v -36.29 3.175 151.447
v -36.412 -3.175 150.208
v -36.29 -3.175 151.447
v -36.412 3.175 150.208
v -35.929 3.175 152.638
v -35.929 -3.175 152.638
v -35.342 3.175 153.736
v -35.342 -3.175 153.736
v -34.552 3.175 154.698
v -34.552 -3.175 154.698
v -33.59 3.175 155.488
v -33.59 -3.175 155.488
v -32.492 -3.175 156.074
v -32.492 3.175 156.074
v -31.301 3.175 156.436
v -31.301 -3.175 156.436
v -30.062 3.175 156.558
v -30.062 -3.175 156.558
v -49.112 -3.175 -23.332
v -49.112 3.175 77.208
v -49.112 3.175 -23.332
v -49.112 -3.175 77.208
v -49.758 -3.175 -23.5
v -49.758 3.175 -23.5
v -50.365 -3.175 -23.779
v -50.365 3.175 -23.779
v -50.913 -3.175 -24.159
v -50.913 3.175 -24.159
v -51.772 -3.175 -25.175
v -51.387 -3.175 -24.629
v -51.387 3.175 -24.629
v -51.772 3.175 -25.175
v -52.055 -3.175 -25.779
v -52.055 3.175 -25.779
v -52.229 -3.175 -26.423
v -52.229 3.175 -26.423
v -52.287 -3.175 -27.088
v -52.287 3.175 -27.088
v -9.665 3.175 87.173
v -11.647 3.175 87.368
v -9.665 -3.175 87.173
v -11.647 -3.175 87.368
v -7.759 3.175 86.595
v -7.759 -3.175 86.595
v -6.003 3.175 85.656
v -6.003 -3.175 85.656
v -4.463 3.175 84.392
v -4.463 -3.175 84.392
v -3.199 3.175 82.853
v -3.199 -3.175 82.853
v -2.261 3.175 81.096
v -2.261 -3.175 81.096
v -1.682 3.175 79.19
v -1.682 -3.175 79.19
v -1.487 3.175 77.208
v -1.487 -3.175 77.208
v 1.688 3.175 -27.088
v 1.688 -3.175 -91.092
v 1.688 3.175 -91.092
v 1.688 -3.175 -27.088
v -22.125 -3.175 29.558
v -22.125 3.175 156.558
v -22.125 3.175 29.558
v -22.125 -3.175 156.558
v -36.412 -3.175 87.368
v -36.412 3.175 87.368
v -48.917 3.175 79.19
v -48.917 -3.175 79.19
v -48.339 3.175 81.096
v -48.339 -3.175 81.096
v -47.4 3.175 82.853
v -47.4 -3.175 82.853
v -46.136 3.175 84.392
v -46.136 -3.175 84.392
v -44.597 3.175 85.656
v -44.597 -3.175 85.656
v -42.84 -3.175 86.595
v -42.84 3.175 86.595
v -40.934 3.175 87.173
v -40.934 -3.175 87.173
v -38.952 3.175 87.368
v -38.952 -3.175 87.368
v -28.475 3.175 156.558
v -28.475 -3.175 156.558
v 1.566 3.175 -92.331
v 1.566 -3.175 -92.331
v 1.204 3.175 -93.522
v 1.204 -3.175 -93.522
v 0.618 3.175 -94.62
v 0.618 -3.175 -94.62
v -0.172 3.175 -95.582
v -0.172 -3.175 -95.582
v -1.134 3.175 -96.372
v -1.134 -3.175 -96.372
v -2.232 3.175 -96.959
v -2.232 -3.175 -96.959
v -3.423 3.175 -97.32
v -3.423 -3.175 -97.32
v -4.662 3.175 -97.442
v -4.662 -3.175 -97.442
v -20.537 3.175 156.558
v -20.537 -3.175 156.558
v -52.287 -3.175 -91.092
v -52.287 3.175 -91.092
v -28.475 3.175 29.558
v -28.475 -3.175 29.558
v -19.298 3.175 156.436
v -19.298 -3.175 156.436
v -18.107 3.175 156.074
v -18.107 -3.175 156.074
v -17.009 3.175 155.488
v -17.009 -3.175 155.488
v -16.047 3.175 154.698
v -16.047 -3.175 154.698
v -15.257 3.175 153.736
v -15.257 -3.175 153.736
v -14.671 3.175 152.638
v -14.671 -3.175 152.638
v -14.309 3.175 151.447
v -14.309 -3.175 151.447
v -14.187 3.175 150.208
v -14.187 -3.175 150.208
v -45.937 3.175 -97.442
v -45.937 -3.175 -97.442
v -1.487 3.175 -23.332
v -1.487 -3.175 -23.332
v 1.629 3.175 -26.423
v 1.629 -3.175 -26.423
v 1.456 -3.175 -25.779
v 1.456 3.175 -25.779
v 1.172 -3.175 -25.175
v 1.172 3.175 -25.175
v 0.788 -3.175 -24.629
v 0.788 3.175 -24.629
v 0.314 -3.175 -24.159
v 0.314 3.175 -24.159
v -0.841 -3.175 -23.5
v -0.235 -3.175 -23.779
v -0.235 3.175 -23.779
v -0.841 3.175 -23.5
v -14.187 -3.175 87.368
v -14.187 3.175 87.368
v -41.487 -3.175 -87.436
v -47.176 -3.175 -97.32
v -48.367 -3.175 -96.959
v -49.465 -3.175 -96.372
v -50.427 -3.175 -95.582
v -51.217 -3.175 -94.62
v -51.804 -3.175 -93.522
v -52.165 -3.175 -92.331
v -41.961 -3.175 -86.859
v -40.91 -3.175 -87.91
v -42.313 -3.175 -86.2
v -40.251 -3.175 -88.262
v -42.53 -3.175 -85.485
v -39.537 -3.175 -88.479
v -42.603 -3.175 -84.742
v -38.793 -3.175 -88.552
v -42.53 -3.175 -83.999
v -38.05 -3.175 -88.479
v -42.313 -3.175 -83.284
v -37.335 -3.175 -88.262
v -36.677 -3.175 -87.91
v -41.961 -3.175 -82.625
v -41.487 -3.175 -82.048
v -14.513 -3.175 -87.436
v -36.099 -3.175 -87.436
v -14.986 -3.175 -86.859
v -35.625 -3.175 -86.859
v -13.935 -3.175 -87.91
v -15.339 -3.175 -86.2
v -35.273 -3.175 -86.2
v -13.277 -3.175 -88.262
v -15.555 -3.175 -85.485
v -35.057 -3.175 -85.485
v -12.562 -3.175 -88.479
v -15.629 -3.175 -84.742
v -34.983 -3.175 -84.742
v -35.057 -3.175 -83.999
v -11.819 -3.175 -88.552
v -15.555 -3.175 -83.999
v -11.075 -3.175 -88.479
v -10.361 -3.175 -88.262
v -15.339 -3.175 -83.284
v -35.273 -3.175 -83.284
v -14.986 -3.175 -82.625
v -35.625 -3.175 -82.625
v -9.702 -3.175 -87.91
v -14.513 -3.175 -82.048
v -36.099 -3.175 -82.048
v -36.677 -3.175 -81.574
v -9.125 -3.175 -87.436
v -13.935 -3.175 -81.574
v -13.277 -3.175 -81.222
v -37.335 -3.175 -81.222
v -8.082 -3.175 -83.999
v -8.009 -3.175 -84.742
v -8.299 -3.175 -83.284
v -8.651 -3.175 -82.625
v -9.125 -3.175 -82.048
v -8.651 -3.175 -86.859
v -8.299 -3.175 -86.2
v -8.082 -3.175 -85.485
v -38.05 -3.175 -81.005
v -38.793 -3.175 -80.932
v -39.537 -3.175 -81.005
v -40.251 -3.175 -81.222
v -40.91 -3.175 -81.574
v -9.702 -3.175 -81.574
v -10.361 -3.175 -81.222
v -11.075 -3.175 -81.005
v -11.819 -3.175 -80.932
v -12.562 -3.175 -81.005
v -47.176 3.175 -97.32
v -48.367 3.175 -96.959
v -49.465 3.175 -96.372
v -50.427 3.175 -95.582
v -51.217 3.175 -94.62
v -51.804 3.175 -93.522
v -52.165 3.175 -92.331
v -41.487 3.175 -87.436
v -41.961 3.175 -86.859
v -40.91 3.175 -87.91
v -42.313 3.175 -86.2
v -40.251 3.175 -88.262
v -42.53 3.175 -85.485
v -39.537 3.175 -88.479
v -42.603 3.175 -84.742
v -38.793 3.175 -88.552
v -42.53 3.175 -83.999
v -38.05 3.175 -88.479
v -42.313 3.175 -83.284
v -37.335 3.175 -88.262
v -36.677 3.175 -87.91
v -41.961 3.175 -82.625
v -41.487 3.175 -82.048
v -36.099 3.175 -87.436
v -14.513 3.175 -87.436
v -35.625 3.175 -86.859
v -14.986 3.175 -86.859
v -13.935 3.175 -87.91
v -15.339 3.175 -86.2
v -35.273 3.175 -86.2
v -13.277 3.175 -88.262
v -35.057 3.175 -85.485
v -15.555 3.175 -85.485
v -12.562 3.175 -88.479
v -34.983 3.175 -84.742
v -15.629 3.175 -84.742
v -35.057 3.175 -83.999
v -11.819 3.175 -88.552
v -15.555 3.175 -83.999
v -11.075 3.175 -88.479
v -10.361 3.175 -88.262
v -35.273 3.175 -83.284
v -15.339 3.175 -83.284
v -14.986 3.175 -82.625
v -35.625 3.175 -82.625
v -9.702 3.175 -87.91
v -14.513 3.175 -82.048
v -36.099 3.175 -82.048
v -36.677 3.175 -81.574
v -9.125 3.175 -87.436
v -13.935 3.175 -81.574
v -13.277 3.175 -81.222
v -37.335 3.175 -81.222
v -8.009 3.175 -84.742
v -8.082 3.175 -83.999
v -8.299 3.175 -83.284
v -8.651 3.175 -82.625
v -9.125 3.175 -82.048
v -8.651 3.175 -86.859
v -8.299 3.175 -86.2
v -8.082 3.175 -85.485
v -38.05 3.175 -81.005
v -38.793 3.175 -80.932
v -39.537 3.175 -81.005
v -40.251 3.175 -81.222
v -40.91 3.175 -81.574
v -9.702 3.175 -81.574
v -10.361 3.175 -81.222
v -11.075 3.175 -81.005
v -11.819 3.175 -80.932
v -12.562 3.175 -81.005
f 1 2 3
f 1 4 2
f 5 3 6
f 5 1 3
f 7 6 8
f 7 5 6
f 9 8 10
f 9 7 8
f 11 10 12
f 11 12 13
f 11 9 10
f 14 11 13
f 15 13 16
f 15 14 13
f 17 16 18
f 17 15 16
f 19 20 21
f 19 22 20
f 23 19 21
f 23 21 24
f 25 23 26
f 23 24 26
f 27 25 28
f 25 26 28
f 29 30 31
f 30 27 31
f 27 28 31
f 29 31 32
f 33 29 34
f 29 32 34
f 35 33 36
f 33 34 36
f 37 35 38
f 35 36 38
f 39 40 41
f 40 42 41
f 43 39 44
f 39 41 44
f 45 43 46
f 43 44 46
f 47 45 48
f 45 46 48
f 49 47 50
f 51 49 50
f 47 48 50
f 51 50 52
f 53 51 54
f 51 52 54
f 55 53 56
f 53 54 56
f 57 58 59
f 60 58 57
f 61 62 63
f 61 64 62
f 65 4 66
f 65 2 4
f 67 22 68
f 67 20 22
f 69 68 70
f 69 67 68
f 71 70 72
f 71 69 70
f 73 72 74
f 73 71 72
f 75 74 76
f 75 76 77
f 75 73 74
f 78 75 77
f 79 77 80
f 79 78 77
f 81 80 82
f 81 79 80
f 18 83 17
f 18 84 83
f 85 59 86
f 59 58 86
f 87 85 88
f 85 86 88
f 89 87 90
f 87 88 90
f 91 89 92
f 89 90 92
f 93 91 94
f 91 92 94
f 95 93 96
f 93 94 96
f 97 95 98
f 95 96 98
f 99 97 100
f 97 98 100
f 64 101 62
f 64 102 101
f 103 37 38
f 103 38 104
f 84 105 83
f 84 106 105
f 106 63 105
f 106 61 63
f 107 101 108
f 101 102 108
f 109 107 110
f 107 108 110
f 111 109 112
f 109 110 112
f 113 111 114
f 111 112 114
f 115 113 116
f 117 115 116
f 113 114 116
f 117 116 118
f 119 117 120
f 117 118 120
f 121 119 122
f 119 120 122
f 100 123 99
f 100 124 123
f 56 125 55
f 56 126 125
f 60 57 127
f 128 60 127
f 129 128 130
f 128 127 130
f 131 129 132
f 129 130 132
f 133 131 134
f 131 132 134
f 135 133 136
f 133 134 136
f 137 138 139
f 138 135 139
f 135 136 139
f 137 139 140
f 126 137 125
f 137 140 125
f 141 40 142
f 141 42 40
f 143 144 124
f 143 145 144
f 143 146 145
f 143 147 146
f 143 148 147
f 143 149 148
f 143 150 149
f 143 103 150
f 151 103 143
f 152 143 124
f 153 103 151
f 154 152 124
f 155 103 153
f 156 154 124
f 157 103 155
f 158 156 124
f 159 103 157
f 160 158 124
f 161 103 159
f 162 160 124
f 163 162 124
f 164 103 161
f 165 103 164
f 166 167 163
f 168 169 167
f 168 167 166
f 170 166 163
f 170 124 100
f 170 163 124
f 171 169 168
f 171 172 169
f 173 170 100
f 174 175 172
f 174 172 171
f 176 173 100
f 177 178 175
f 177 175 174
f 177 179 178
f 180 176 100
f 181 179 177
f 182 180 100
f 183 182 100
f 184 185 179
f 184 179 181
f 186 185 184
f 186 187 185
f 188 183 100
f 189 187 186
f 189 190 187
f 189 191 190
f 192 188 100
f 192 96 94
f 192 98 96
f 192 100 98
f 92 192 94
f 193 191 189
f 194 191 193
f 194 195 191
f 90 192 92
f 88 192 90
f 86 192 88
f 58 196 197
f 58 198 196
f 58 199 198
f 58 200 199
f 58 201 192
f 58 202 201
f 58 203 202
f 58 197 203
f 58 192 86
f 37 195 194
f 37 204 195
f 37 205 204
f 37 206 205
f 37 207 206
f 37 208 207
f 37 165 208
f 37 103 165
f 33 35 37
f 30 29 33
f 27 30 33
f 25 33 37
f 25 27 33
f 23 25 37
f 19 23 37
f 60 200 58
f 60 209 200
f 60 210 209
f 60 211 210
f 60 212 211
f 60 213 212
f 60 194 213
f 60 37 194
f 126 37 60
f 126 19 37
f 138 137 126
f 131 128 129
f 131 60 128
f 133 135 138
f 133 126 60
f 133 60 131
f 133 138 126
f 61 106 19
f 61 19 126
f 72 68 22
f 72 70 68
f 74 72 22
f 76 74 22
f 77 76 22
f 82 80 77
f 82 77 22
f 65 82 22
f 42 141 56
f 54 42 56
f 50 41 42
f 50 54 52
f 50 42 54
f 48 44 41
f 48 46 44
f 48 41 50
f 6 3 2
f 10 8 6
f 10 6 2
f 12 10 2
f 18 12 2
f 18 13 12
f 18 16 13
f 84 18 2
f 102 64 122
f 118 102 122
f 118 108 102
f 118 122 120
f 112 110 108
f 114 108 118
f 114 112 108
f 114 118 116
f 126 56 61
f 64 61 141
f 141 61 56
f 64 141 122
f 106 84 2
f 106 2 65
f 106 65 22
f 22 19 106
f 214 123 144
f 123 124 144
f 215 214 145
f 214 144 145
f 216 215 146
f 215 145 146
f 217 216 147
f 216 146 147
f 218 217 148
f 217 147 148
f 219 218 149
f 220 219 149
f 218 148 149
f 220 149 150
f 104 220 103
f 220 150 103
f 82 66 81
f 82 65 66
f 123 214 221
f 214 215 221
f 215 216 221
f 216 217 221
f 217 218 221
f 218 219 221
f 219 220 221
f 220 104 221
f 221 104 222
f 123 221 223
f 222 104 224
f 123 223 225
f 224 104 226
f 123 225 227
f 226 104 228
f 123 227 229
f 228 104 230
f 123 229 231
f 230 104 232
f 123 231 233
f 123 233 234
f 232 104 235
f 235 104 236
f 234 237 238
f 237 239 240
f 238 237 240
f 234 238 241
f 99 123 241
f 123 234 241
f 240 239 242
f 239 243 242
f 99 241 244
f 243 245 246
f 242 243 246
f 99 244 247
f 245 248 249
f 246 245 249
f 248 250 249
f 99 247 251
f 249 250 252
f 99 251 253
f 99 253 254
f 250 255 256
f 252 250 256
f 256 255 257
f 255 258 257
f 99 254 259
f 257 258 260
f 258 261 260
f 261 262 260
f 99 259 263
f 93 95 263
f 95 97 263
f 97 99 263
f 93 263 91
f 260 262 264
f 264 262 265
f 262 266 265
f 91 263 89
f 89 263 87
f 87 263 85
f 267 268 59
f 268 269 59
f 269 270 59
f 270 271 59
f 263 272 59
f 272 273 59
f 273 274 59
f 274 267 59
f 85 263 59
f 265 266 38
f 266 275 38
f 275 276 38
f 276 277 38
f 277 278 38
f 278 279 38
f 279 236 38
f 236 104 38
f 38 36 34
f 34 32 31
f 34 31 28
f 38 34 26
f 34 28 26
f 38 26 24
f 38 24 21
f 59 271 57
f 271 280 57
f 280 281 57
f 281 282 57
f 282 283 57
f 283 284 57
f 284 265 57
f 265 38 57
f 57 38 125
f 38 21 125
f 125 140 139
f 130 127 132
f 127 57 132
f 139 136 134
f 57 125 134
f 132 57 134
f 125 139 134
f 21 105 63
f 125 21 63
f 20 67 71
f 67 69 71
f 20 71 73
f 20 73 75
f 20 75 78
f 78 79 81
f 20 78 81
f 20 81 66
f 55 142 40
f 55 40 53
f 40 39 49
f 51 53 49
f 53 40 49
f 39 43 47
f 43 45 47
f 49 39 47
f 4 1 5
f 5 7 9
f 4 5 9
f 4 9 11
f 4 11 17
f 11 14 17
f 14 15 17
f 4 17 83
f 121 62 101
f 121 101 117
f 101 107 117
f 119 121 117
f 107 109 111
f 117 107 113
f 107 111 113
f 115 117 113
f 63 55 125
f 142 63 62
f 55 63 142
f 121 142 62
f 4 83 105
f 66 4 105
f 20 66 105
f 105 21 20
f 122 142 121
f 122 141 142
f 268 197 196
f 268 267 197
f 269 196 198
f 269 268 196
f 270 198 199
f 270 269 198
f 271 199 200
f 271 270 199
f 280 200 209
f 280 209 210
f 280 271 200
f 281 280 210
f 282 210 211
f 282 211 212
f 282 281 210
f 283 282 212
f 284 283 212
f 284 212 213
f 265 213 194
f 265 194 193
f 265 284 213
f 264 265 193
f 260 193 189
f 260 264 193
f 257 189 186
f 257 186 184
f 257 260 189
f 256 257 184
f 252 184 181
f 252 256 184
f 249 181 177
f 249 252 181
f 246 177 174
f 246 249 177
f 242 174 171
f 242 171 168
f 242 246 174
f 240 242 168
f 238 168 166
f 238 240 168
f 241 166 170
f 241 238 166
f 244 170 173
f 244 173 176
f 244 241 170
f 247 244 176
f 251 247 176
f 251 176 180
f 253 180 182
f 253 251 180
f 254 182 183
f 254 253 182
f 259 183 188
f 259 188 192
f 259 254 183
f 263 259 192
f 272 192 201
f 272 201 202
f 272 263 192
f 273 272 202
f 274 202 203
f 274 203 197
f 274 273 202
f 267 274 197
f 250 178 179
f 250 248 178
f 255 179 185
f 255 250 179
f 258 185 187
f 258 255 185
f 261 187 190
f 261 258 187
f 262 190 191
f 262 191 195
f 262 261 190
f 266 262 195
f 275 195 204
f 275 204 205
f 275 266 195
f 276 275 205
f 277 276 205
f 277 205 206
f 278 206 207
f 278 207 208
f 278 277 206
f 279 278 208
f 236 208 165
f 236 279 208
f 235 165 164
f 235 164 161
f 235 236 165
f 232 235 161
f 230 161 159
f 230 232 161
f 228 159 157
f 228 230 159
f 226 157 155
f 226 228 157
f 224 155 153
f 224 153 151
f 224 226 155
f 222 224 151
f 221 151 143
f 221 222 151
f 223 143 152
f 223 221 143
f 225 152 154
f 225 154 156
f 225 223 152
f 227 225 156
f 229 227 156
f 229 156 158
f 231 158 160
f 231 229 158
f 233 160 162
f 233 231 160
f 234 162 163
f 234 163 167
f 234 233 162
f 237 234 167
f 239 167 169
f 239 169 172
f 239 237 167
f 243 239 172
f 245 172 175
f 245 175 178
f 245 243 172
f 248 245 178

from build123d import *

# Parameters (mm, degrees)
F0_R        = 3.81
F1_DEPTH    = 3.175
F2_R        = 10.16
F3_R        = 6.35
F4_T1_DEPTH = 25.1335533113
F5_R        = 6.35


# Not quite as in the source:
# - a fillet or chamfer that OpenCascade refuses, or shapes differently, is made with other operations: its cross-section is extruded or revolved along the edge and cut away or added


with BuildPart() as f1:
    # F0 (on Front) → F1 (new body, symmetric)
    with BuildSketch(Plane.XZ):
        Polygon((-49.1121449284, -23.3316957779), (-52.2871449284, -23.3316957779), (-52.2871449284, -97.4421674833), (1.6878550716, -97.4421674833), (1.6878550716, -23.3316957779), (-1.4871449284, -23.3316957779), (-1.4871449284, 87.3682325167), (-14.1871449284, 87.3682325167), (-14.1871449284, 156.5578325167), (-22.1246449284, 156.5578325167), (-22.1246449284, 29.5578325167), (-28.4746449284, 29.5578325167), (-28.4746449284, 156.5578325167), (-36.4121449284, 156.5578325167), (-36.4121449284, 87.3682325167), (-49.1121449284, 87.3682325167), align=None)
        with Locations((-38.7933949284, -84.7421674833)):
            Circle(F0_R, mode=Mode.SUBTRACT)
        with Locations((-11.8185949284, -84.7421674833)):
            Circle(F0_R, mode=Mode.SUBTRACT)
    extrude(amount=F1_DEPTH, both=True)

    # F2
    f2_edges = [f1.edges().sort_by_distance(p)[0] for p in [
        (-1.487145, 0, 87.368233),
        (-49.112145, 0, 87.368233),
    ]]
    fillet(f2_edges, radius=F2_R)

    # F3
    f3_edges = [f1.edges().sort_by_distance(p)[0] for p in [
        (-14.187145, 0, 156.557833),
        (-36.412145, 0, 156.557833),
    ]]
    fillet(f3_edges, radius=F3_R)

    # F4: fillet of radius 3.81 on 2 edges, made by hand

    # F4_s2 → F4_t1 (cut)
    with BuildSketch(Plane.XZ.offset(-12.5667766557)):
        with BuildLine():
            ThreePointArc((-49.1121449284, -23.3316957779), (-51.3870804947, -24.6290620154), (-52.2871449284, -27.0884064402))
            Line((-52.2871449284, -27.0884064402), (-52.2871449284, -23.3316957779))
            Line((-52.2871449284, -23.3316957779), (-49.1121449284, -23.3316957779))
        make_face()
        with BuildLine():
            ThreePointArc((1.6878550716, -27.0884064402), (0.7877906379, -24.6290620154), (-1.4871449284, -23.3316957779))
            Line((-1.4871449284, -23.3316957779), (1.6878550716, -23.3316957779))
            Line((1.6878550716, -23.3316957779), (1.6878550716, -27.0884064402))
        make_face()
    extrude(amount=F4_T1_DEPTH, mode=Mode.SUBTRACT)

    # F5
    f5_edges = [f1.edges().sort_by_distance(p)[0] for p in [
        (-52.287145, 0, -97.442167),
        (1.687855, 0, -97.442167),
    ]]
    fillet(f5_edges, radius=F5_R)


solid = f1.part
